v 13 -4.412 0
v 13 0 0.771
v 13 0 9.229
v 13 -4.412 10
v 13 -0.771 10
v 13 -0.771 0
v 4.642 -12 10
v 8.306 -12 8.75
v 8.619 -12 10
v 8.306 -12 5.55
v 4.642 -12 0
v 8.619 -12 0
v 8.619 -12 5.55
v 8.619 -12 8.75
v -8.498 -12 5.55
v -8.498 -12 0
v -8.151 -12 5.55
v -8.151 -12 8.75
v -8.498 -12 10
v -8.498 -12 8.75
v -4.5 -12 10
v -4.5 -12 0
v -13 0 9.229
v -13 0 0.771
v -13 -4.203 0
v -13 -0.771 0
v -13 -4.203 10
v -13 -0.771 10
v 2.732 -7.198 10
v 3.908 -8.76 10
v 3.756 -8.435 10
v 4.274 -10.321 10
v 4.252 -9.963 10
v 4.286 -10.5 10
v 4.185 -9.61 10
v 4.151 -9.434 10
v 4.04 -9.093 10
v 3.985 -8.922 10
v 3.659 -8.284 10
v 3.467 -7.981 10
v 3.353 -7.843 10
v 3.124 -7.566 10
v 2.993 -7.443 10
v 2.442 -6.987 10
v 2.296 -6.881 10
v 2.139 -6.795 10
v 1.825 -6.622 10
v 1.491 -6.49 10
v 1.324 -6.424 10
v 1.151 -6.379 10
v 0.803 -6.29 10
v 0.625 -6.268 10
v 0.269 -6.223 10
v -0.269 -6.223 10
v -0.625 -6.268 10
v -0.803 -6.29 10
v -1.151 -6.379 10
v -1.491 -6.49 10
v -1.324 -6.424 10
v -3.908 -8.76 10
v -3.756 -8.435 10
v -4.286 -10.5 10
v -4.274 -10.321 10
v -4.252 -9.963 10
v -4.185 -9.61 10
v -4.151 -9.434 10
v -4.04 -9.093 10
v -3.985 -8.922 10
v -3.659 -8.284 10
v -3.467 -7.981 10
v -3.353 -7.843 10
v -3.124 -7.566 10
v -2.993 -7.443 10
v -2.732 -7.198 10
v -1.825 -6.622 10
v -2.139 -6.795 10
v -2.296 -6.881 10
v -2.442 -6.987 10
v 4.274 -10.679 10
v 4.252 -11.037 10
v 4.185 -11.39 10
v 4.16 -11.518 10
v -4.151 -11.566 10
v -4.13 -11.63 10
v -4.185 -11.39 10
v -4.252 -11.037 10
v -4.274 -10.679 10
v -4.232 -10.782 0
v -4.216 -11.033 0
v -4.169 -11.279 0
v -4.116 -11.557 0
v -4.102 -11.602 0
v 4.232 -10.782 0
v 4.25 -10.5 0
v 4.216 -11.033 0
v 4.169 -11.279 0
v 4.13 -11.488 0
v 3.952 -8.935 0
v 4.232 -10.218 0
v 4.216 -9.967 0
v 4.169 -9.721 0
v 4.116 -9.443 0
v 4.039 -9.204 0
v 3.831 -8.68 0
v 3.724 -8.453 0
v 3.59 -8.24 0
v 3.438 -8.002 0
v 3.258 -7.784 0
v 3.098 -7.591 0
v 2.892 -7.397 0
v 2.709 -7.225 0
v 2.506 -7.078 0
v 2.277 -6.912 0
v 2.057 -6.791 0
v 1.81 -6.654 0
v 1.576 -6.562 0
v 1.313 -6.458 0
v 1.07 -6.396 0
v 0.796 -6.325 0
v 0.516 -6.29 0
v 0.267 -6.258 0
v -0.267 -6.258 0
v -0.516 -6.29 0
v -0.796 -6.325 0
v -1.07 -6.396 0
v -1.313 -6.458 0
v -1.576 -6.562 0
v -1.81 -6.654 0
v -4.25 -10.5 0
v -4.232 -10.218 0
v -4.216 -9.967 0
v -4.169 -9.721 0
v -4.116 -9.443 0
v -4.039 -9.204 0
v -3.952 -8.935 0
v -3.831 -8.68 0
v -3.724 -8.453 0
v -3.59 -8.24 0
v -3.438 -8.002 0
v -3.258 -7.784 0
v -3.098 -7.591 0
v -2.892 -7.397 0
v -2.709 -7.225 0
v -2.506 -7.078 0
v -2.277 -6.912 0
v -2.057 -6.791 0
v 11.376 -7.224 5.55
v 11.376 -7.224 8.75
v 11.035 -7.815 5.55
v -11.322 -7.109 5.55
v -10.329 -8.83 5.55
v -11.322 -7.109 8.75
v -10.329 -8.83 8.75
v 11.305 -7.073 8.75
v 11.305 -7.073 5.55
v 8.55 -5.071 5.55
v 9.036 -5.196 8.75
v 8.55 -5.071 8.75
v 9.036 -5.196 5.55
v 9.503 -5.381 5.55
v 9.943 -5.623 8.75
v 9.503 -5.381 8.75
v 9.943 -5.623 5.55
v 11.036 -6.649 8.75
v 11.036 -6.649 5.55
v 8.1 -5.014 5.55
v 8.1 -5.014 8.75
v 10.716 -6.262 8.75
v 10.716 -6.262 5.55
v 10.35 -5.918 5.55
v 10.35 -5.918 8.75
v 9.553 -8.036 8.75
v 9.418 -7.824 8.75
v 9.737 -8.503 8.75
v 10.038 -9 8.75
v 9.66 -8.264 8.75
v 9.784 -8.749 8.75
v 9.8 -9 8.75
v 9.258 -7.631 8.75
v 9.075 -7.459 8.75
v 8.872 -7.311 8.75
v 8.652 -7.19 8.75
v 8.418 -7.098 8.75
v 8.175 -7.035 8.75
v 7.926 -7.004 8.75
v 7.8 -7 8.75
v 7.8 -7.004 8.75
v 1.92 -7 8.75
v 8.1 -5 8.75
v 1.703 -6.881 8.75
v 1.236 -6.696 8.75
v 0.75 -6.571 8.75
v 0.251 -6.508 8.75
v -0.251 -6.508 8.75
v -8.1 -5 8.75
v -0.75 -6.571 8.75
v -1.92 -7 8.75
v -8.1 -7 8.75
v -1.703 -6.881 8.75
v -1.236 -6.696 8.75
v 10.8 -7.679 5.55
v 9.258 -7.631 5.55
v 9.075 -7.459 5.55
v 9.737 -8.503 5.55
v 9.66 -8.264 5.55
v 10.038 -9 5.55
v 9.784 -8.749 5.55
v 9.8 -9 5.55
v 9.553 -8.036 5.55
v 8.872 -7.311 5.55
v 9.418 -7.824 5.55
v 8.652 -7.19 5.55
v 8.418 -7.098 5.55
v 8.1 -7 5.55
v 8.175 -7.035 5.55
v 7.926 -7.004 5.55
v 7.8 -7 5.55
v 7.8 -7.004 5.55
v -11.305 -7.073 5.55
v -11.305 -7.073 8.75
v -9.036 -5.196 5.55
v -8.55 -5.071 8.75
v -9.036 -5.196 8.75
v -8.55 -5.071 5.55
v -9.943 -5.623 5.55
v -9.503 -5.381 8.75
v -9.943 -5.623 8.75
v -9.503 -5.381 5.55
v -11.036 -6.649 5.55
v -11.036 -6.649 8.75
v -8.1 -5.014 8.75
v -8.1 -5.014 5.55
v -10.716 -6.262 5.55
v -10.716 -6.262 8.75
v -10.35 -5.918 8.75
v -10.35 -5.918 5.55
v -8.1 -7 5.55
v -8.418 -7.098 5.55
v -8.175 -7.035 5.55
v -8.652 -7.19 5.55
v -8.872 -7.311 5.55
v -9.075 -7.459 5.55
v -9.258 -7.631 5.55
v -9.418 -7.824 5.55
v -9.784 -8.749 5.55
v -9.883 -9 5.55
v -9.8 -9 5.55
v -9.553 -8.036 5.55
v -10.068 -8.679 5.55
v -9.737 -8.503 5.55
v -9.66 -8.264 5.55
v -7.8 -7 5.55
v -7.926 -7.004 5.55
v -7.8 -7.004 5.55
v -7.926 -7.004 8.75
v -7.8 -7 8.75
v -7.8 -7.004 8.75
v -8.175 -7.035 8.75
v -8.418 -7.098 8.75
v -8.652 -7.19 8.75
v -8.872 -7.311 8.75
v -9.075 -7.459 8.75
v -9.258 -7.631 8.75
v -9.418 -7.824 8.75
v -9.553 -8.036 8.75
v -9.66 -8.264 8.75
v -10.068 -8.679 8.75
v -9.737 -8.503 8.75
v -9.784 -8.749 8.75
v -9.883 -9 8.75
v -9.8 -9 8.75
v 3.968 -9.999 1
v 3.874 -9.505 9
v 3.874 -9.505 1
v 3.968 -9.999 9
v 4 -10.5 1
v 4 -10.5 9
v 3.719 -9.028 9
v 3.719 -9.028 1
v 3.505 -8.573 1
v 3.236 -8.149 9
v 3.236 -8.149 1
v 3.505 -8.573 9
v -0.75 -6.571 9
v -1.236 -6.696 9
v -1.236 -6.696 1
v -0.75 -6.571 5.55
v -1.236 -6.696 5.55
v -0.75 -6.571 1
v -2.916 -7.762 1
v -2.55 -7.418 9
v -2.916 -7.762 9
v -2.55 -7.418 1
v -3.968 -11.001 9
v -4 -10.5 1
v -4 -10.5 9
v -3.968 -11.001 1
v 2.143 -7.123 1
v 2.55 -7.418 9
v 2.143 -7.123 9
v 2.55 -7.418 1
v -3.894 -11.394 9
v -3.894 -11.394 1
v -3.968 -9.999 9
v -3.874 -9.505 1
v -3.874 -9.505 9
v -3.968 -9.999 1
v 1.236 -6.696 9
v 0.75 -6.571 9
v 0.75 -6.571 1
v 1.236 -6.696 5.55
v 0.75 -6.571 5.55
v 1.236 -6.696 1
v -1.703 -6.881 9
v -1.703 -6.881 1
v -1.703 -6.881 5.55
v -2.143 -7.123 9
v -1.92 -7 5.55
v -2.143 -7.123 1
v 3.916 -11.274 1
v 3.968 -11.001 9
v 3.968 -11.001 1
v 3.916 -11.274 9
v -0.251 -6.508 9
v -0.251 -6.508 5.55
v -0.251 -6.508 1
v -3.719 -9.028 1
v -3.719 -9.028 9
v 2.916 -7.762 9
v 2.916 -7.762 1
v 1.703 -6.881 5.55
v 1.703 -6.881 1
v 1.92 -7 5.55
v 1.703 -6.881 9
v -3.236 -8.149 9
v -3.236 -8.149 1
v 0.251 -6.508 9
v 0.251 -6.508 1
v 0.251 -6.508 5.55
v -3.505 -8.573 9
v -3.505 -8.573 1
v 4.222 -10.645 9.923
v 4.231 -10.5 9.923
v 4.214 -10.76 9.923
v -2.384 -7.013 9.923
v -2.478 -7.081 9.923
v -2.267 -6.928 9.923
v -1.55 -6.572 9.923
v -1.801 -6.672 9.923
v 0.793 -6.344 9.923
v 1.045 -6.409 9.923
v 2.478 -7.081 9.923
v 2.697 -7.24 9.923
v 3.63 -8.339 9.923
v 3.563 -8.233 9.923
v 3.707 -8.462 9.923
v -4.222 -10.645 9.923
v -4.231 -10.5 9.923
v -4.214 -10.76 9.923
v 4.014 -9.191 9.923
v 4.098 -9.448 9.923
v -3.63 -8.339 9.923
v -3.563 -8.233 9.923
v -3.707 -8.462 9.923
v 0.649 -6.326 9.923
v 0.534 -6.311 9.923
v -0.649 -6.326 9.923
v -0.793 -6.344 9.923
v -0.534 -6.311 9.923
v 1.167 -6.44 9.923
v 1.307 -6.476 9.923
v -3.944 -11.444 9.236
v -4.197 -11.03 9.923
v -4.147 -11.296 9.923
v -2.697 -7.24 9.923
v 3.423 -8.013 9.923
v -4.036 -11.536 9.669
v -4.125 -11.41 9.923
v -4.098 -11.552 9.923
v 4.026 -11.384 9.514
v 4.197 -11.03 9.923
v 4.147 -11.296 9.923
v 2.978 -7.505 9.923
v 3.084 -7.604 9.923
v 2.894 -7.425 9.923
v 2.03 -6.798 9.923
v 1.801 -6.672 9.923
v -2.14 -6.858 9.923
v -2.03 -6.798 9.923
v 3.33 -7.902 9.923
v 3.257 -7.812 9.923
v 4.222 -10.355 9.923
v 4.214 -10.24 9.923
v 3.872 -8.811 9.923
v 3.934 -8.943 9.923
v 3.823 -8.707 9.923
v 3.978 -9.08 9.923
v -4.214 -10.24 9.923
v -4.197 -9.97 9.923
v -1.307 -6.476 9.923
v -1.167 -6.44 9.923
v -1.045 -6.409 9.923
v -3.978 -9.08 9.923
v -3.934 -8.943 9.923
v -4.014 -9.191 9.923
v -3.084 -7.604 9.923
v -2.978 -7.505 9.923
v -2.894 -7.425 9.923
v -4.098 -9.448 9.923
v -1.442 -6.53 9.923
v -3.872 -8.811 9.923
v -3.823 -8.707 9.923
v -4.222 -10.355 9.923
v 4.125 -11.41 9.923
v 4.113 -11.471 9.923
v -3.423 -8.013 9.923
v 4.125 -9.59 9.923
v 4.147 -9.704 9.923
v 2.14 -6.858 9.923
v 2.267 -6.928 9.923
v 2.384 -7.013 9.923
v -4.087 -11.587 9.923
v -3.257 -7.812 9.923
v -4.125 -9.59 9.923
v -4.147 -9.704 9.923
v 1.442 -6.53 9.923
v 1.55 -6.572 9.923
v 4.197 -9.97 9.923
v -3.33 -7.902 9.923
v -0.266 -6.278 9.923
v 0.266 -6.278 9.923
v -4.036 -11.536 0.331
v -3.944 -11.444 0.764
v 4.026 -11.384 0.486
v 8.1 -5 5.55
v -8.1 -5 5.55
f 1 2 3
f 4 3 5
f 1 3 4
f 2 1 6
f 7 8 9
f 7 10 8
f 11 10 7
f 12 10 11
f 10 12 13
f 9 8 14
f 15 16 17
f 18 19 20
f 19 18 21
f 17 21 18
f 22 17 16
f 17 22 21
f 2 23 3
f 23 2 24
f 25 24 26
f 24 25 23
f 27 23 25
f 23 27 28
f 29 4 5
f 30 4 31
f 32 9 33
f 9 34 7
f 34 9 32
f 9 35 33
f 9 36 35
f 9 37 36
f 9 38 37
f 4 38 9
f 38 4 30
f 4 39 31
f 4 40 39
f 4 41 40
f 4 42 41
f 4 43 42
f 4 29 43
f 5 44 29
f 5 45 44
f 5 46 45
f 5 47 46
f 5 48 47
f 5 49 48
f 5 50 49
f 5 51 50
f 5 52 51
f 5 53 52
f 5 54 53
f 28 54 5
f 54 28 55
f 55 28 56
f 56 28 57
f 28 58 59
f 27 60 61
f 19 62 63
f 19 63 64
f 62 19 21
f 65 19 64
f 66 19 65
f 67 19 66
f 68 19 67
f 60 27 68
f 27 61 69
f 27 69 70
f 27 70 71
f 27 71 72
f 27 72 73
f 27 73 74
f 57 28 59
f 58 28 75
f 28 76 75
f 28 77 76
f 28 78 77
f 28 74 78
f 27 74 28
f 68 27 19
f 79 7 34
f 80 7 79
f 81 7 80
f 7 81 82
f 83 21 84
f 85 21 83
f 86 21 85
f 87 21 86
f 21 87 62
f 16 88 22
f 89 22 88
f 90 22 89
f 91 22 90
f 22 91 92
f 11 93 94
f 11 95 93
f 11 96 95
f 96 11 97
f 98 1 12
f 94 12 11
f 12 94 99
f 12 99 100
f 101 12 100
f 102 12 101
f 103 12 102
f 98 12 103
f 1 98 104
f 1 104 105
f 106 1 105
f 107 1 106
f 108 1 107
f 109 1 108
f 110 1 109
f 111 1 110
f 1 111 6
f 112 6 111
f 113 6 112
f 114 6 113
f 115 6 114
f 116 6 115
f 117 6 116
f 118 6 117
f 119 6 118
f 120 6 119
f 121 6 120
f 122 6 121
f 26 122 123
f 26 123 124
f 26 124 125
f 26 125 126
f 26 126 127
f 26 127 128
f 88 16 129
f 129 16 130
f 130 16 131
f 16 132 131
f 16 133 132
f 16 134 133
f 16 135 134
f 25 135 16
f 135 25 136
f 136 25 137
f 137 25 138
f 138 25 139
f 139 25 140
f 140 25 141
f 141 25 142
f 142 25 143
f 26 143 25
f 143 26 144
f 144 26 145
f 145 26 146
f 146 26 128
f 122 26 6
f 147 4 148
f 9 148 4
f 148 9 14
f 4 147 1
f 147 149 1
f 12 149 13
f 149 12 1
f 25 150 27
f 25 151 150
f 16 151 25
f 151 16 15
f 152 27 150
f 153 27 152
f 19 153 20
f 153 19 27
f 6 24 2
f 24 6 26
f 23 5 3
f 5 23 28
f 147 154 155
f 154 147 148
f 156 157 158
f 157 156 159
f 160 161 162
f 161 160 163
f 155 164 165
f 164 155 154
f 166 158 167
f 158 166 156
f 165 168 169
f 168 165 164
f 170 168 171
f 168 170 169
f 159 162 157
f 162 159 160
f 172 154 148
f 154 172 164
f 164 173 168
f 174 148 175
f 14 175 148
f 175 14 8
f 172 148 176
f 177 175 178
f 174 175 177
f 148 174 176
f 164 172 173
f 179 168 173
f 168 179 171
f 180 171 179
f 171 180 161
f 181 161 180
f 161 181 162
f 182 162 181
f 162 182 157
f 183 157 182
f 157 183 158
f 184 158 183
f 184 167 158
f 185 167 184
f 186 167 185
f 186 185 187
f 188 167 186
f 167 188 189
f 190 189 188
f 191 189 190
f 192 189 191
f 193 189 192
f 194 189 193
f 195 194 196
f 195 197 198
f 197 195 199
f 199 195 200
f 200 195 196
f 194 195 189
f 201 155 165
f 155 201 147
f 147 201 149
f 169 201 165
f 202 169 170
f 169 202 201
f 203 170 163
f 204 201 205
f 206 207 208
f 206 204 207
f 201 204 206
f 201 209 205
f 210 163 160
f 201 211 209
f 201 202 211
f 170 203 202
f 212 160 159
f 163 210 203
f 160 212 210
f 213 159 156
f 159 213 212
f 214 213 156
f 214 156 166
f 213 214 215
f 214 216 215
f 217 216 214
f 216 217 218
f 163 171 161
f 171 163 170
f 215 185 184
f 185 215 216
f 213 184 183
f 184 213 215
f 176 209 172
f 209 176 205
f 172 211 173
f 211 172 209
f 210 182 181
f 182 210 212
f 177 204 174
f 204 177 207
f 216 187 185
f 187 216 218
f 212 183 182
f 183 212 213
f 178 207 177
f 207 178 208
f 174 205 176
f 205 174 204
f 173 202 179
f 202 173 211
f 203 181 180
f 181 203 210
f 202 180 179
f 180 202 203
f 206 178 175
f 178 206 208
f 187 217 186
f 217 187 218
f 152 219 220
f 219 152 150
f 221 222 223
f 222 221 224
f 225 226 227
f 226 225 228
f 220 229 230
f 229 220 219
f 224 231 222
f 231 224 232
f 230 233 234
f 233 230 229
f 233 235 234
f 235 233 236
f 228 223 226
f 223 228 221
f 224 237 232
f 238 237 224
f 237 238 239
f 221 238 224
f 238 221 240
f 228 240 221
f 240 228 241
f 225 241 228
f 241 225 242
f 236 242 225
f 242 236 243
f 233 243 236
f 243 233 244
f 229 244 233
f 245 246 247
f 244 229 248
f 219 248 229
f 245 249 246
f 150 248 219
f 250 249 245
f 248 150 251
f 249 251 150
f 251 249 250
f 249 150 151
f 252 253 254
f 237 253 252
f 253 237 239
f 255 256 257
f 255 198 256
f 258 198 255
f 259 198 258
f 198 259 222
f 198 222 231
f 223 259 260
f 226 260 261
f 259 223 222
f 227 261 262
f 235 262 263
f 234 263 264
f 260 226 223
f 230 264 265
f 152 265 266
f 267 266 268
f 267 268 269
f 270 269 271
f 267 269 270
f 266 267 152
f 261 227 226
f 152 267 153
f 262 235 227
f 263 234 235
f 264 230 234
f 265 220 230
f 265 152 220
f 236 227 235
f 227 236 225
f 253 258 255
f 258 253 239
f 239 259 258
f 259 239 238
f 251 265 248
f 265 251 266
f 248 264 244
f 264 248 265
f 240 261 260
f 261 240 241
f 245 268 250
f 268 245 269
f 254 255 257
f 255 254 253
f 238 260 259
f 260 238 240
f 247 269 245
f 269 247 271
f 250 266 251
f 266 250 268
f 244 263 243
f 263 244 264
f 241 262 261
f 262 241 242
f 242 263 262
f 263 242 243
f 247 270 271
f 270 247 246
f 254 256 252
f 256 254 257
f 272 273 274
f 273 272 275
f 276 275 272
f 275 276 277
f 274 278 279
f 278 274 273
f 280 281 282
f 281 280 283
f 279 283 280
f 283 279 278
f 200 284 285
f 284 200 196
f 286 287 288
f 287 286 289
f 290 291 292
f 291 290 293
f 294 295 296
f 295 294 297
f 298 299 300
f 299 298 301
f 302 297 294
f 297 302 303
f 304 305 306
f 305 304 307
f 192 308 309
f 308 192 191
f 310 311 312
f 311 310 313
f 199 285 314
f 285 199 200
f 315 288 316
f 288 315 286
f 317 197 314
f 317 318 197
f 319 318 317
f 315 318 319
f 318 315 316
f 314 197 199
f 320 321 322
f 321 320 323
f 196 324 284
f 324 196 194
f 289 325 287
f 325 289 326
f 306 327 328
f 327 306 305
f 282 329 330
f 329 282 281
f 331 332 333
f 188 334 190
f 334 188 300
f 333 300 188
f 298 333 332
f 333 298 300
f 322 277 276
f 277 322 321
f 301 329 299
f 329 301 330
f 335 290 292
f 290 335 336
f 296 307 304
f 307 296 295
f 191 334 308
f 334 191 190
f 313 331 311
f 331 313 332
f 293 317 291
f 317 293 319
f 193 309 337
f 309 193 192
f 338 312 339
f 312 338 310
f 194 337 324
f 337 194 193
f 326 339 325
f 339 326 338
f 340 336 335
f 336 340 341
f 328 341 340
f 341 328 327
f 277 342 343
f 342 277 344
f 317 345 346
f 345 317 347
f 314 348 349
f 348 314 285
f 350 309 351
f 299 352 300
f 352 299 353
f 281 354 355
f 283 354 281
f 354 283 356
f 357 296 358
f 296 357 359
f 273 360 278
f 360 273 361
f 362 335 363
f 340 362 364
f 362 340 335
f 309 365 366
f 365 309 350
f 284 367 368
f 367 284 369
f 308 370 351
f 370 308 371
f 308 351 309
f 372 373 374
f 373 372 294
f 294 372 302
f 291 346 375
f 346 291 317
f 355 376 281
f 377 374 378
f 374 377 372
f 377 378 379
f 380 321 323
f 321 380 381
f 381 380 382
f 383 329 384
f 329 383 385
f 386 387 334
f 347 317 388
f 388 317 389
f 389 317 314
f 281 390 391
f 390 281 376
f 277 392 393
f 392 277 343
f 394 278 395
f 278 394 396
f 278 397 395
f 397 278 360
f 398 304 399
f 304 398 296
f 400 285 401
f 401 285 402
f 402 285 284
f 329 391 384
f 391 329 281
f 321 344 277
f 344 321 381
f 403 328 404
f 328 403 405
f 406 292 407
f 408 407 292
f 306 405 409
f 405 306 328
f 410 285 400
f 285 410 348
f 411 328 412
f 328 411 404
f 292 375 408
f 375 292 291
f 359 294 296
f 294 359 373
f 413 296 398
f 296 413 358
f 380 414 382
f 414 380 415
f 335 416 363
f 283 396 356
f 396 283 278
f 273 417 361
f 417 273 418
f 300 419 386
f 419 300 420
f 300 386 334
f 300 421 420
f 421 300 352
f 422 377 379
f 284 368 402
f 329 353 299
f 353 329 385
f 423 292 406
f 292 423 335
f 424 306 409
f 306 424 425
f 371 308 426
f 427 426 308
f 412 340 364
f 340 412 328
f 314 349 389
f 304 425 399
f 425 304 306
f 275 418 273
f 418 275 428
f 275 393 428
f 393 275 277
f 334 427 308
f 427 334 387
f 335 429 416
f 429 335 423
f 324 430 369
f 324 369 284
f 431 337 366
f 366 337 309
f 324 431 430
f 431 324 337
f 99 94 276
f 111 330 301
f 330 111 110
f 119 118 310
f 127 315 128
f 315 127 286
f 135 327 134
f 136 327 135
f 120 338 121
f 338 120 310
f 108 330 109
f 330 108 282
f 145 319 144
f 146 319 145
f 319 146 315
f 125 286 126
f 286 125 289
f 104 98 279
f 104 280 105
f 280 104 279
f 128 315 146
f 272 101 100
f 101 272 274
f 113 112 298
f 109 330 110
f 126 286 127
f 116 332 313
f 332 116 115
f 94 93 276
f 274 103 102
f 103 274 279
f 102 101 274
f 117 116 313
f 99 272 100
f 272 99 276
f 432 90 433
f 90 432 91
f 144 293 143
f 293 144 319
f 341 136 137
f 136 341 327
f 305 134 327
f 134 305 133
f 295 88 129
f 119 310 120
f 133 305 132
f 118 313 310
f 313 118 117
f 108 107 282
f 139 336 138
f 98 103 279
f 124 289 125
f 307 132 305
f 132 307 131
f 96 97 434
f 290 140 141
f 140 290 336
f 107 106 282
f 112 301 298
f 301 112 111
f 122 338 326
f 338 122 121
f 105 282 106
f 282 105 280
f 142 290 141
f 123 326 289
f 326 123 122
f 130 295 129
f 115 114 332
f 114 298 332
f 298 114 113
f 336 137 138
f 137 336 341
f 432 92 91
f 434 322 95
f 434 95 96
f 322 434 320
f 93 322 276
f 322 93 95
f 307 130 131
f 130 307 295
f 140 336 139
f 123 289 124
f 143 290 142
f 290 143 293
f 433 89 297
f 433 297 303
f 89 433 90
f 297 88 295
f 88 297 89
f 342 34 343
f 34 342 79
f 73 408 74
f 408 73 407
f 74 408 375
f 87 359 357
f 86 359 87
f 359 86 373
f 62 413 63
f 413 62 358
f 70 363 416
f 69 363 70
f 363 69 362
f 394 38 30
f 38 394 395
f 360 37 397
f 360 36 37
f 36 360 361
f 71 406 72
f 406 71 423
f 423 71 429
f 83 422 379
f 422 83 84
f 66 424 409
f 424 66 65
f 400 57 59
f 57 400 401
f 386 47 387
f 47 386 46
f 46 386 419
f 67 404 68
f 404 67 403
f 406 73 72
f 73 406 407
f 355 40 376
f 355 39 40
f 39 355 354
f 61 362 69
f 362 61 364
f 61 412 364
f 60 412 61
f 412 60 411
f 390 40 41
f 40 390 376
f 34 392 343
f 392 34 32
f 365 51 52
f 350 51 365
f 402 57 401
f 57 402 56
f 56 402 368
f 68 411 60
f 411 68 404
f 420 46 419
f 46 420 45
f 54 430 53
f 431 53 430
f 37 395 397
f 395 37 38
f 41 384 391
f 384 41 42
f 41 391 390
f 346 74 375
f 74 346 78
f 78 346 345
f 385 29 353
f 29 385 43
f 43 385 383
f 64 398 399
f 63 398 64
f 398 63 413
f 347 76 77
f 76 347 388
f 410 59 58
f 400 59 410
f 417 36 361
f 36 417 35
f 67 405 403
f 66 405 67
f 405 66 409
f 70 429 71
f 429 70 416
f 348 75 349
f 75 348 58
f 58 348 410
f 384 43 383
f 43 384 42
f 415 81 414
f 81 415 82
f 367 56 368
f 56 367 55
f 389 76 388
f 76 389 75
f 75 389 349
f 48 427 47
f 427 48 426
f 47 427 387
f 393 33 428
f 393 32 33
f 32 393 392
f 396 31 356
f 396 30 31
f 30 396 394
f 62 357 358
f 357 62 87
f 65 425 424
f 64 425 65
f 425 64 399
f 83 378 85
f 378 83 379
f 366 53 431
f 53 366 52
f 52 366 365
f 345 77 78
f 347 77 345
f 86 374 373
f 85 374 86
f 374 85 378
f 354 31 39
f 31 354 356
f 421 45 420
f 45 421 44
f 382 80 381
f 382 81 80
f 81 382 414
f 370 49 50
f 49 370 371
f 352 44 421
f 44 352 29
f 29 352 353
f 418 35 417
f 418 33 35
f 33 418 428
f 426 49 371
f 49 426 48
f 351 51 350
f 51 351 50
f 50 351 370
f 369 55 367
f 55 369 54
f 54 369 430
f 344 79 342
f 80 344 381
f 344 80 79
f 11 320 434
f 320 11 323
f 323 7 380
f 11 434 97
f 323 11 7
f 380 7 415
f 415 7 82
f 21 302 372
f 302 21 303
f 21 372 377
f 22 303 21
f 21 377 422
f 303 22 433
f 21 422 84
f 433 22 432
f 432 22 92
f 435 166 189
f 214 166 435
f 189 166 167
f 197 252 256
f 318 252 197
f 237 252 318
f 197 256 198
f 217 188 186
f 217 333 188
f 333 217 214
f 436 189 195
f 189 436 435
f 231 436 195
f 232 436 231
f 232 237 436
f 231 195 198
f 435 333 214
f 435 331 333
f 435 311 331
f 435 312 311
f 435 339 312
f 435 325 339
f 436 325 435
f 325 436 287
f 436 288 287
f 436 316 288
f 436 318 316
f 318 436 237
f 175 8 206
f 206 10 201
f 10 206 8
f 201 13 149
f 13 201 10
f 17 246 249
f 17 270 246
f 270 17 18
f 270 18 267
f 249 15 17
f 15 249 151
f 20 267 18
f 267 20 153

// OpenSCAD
// file: ../_includes/dimensions_cube.scad
include <dimensions_mk3.scad>;
PROFILE_SZ        = 20;
ROD_Y_LEN         = 390;
FRONT_PROFILE_LEN = 380;
WIDTH             = FRONT_PROFILE_LEN + 2*PROFILE_SZ;
// file: ../_includes/dimensions_mk3.scad
MK3_ROD_DIA           = 8;
MK3_ROD_Y_LEN         = 330;
MK3_ROD_X_LEN         = 370;
MK3_ROD_X_LEN_VISIBLE = 308;//measured
MK3_Z_TRAPESOID_DIST  = MK3_ROD_X_LEN_VISIBLE +2*18-8;//measured == 336
// main file
// PRUSA iteration4
// Y holder front
// GNU GPL v3
// Josef Průša <iam@josefprusa.cz> and contributors
// http://www.reprap.org/wiki/Prusa_Mendel
// http://prusamendel.org

//CUBE printer - mk3 modification by Radek Vana


/*****************************************************************************/
//includes
include <../_includes/dimensions_mk3.scad>;
include <../_includes/dimensions_cube.scad>;
/*****************************************************************************/
//variables
dep_mk3 = 10;//originallen on mk3 printer
wid = 26;
dep =10;// (CUBE_ROD_Y_LEN - MK3_ROD_Y_LEN)/2 - dep_mk3;
hei = 12;

rod_z_pos = 10.5;
rod_d = MK3_ROD_DIA;
rod_d_edge = rod_d + 1;
rod_h_edge = 2;
rod_d_edge2 = rod_d + 2;
rod_h_edge2 = 1.4;
/*****************************************************************************/
//modules
module ziptie_round_edge()
{
    difference()
    {
        translate([0,0,0]) rotate([90,0,0]) cylinder( h=3.2, r=4, $fn=50 );  
        translate([0,1,0]) rotate([90,0,0]) cylinder( h=5, r=2, $fn=50 );  
        translate([-10,-4,0]) cube([20,5,5]);
        translate([-20,-4,-13]) cube([20,5,20]);
    }
}


module part()    
{

    difference()
    {
        union()
        {
            // body block
            difference() {
                translate([-wid/2,0,0]) cube([wid,dep,hei]);
                
                // upper corners
                translate([4,-0.5,20]) rotate([0,60,0]) cube([20,30,20]);
                translate([-21.2,-0.5,30]) rotate([0,120,0]) cube([20,30,20]);
                translate([-15,-0.3,-6]) rotate([45,0,0]) cube([30,5,5]);
                translate([15,10.3,-6]) rotate([45,0,180]) cube([30,5,5]);
            }

        }

        // y-axis cut
        translate([0,0,rod_z_pos]) rotate([-90,0,0])  cylinder( h=dep, d=rod_d, $fn=50 );
        translate([0,dep+1,rod_z_pos])  rotate([90,0,0])  cylinder( h=rod_h_edge,  d1=rod_d_edge,  d2=rod_d, $fn=50 );
        translate([0,-1,rod_z_pos]) rotate([-90,0,0]) cylinder( h=rod_h_edge,  d1=rod_d_edge,  d2=rod_d, $fn=50 );
        translate([0,dep+1,rod_z_pos])  rotate([90,0,0])  cylinder( h=rod_h_edge2, d1=rod_d_edge2, d2=rod_d, $fn=50 );
        translate([-7,-1,rod_z_pos+4]) rotate([0,45,0]) cube([10,20,10]);//edge

        
        // ziptie
        translate([7.8,  8.75 ,9]) ziptie_round_edge();
        translate([-7.8, 5.55, 9]) rotate([0,0,180]) ziptie_round_edge();
        translate([-8.1, 5.55, 5]) cube([16.2,3.2,2]);
        translate([0.8,  5.55, 25]) rotate([0,60,0]) cube([20,3.2,2]);
        translate([-1.8, 5.55, 27]) rotate([0,120,0]) cube([20,3.2,2]);

    }
}

/*****************************************************************************/
//part
rotate([90,0,0])part();
